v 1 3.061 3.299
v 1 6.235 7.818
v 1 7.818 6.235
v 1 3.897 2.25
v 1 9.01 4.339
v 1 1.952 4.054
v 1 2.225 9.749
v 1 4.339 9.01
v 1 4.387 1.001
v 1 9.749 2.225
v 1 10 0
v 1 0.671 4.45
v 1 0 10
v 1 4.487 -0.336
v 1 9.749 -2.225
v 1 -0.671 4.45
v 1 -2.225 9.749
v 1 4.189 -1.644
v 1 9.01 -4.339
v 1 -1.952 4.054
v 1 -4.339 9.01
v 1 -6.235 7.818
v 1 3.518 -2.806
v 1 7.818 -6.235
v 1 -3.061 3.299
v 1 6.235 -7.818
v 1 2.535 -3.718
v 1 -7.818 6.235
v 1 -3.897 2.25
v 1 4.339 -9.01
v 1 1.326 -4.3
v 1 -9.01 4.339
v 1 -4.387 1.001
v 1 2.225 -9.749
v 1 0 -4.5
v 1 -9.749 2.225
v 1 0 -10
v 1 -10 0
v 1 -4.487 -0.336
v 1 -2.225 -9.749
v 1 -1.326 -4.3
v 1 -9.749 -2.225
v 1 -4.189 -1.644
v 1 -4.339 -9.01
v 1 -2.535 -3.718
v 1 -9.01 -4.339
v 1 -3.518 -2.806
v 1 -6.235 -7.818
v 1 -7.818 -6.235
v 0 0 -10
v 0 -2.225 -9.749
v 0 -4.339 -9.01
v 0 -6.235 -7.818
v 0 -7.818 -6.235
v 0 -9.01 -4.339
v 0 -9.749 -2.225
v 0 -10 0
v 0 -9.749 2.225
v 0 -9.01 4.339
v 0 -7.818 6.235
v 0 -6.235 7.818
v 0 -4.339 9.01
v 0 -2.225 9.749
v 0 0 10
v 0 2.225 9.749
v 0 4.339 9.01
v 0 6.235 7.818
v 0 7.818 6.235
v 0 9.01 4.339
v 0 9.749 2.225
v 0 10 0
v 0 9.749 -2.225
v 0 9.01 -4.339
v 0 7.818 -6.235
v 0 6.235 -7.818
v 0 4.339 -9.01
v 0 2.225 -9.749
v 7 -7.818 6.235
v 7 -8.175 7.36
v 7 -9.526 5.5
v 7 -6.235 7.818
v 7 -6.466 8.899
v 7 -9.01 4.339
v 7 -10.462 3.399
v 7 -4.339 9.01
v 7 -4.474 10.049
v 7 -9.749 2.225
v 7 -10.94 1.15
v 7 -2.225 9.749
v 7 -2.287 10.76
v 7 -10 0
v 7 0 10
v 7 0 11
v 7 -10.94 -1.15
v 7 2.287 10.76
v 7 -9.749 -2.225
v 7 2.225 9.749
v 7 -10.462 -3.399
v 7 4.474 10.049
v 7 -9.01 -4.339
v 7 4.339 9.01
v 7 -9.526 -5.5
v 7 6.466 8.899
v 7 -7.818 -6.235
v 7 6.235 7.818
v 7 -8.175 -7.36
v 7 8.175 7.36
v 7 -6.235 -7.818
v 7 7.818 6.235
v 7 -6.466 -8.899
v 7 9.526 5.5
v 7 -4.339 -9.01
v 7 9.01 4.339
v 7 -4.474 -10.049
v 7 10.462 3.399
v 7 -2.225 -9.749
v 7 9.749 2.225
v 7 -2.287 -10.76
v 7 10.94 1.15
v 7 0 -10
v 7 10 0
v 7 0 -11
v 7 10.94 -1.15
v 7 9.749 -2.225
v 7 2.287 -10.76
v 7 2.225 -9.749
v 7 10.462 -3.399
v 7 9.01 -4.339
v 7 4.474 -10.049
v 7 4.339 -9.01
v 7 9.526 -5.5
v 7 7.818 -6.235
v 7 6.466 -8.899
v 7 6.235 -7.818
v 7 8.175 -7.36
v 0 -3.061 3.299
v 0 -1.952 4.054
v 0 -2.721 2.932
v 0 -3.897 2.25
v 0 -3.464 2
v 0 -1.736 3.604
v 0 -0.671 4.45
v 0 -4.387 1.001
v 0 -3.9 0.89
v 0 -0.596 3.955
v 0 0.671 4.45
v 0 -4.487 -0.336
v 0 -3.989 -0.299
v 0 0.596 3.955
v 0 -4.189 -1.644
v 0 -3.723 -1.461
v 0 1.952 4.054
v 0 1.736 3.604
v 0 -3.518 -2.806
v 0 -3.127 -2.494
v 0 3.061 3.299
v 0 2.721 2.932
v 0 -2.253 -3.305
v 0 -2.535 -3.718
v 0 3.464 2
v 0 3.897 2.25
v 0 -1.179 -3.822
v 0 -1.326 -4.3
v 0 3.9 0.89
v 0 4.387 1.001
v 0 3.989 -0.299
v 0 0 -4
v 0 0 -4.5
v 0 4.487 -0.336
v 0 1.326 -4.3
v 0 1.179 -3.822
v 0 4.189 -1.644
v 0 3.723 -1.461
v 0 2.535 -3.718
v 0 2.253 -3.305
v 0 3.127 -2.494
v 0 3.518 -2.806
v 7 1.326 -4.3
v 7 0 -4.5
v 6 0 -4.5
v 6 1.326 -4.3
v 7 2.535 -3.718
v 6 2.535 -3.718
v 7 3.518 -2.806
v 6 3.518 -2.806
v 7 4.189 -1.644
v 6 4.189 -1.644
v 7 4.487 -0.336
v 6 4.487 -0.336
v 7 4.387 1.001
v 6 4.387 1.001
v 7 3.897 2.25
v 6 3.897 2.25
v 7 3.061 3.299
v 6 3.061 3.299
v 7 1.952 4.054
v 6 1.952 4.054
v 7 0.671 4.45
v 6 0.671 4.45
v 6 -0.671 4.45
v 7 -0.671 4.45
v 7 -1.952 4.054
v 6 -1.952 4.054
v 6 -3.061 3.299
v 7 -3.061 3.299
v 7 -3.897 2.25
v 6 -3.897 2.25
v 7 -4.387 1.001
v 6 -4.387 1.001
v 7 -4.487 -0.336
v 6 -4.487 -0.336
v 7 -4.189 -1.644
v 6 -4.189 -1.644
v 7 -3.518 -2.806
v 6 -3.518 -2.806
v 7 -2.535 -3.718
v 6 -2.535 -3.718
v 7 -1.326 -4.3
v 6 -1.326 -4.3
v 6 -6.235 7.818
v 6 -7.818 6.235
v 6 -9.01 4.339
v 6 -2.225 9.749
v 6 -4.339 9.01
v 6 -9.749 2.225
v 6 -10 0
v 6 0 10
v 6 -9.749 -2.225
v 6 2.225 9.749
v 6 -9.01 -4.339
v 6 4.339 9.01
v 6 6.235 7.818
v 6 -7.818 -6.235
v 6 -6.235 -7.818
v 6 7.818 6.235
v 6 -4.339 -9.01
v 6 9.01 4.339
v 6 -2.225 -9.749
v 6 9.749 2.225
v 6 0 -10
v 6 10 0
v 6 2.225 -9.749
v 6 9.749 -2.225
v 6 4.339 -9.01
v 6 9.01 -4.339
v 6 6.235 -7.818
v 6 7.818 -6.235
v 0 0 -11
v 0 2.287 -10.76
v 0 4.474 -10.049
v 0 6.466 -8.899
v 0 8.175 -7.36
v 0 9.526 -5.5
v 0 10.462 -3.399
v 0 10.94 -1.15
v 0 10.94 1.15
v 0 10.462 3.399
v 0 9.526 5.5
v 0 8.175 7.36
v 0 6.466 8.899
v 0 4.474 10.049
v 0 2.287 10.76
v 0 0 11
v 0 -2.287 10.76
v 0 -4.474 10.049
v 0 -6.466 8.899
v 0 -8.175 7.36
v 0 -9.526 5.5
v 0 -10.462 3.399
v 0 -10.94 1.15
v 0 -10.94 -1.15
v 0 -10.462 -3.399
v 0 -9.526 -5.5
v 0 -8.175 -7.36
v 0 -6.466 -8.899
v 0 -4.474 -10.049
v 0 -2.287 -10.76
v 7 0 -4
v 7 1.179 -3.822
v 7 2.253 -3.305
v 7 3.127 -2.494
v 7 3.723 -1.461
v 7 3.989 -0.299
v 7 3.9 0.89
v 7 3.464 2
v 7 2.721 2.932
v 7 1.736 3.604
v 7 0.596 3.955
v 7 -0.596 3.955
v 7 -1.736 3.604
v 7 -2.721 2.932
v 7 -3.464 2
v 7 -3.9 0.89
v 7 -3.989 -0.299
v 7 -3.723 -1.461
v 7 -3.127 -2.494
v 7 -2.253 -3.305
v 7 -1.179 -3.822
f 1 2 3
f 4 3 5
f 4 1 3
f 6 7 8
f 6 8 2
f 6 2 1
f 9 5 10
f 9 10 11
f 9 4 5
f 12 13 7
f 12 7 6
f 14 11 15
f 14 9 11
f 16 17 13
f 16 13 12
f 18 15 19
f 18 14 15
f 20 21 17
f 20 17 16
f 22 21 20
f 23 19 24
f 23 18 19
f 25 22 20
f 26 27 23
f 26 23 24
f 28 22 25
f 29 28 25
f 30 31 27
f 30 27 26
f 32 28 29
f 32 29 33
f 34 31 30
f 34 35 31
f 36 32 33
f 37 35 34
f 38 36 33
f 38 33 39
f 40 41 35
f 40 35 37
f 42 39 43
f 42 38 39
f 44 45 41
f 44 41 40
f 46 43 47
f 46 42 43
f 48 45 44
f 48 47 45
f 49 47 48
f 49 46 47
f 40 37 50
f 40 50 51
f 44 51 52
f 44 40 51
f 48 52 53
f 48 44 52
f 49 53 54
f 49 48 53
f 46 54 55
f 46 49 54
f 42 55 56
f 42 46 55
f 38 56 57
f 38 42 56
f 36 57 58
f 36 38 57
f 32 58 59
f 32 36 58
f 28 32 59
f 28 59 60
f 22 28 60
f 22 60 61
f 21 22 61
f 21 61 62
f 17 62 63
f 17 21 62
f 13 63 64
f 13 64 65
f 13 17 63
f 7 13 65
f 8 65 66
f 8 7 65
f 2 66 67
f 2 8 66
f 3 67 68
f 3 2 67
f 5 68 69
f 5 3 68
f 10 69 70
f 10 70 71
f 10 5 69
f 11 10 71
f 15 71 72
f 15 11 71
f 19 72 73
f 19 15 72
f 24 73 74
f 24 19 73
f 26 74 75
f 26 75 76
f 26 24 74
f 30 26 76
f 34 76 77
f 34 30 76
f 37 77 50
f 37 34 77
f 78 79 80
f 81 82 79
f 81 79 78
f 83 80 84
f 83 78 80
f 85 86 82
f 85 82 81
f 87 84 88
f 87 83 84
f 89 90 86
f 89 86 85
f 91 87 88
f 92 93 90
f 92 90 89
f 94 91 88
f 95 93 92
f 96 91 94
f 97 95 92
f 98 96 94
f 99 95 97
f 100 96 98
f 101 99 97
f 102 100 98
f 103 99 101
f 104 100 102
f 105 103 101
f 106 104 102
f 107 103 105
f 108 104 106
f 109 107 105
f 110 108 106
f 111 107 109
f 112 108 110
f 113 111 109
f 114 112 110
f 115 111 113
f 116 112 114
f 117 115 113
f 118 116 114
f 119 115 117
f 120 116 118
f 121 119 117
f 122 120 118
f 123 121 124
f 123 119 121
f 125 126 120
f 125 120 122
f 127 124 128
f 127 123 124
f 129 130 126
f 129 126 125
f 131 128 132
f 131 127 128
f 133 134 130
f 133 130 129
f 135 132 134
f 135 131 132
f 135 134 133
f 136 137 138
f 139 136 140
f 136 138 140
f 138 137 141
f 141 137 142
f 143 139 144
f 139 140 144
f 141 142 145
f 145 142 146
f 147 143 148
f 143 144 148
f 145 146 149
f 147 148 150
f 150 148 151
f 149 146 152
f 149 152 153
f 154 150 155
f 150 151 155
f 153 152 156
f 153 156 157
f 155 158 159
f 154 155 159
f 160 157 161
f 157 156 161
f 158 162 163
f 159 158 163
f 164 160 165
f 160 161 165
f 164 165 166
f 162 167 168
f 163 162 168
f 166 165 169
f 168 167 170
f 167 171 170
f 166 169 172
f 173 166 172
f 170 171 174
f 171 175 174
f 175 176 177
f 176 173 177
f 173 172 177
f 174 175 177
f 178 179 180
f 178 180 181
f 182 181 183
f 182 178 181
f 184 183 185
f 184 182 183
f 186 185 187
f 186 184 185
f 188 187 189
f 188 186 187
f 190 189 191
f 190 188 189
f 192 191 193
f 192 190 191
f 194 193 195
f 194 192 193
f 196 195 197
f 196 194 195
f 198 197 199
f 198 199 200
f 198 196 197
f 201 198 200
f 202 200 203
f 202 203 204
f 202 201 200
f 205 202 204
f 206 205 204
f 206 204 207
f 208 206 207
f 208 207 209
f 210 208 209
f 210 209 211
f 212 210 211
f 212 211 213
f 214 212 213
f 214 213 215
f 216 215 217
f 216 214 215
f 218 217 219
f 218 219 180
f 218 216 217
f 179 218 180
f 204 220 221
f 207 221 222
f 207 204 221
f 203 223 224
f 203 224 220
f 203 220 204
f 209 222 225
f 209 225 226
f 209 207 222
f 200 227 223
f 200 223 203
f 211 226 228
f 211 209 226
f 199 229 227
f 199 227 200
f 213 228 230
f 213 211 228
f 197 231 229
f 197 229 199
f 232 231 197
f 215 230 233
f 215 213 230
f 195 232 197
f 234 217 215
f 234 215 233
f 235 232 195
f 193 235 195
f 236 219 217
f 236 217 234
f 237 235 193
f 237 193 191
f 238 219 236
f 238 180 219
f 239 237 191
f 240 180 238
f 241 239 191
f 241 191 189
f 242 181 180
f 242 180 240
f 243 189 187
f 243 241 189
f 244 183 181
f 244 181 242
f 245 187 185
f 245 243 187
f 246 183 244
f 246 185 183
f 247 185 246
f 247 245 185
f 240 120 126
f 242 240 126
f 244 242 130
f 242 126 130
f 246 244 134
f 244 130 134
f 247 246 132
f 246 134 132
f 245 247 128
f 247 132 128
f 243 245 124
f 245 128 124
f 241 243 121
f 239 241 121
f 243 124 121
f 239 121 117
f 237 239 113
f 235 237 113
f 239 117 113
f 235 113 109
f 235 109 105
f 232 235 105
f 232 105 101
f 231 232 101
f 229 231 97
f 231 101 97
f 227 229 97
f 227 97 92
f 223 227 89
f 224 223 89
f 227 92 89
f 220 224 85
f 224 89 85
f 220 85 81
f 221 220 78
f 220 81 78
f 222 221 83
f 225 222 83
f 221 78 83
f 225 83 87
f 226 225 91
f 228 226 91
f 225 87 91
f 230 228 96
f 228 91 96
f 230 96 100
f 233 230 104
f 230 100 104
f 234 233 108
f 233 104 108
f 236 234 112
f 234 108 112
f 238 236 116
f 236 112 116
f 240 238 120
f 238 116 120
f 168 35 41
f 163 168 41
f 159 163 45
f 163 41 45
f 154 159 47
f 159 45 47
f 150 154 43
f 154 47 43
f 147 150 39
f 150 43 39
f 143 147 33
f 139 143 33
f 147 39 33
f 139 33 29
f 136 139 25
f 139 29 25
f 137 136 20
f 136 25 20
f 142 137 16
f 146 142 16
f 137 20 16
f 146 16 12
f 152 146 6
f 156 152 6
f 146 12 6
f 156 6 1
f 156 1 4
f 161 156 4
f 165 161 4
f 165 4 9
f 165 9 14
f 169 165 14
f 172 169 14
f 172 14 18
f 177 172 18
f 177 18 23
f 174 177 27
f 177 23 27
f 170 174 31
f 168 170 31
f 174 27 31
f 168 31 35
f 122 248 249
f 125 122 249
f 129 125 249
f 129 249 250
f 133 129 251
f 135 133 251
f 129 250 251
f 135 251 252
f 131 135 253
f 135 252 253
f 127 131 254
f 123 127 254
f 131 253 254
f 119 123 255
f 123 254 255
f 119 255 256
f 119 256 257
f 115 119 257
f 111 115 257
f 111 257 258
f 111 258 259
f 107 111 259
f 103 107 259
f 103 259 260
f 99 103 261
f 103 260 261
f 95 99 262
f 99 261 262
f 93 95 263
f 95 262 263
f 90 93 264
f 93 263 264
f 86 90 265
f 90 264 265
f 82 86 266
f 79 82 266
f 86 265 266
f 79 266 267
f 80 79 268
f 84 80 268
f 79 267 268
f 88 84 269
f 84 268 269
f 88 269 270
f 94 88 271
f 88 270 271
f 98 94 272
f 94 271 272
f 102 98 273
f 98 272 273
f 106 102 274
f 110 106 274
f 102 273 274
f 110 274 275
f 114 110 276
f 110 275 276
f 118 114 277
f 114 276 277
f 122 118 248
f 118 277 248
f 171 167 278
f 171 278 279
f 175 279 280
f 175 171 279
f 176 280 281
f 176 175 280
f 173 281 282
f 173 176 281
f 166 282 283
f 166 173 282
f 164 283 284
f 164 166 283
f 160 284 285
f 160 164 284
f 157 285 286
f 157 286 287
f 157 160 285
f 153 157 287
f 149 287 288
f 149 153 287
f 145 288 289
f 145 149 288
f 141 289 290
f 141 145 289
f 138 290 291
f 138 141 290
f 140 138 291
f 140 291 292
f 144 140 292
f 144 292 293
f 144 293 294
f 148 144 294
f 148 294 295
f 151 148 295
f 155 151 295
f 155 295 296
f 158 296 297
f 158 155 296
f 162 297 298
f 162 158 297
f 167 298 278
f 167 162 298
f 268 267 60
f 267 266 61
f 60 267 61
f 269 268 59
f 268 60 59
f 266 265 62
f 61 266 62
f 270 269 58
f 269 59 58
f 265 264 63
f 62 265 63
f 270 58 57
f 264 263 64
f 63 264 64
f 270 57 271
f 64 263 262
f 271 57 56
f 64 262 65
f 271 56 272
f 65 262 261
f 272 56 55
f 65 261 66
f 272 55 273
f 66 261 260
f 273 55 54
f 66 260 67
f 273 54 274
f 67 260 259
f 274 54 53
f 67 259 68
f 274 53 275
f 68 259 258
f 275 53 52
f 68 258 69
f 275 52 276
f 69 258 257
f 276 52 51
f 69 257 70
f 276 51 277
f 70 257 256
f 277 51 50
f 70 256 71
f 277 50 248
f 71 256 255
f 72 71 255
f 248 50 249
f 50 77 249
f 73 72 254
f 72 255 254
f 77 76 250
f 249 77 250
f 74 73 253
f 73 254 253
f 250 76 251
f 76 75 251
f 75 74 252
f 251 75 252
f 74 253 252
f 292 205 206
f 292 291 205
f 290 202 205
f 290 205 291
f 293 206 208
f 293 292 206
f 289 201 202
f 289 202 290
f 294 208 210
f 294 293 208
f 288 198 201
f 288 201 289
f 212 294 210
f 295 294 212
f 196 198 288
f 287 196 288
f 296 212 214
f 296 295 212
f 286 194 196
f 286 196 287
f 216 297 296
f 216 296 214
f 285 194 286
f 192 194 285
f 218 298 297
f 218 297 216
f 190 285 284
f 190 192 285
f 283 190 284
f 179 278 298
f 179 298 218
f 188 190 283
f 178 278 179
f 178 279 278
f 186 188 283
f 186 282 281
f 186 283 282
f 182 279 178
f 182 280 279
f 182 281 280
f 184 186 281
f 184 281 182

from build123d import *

# Parameters (mm, degrees)
CROQUIS1_R              = 11
CROQUIS1_R_2            = 4
SALIENTE_EXTRUIR1_DEPTH = 7
CROQUIS2_R              = 10
CROQUIS2_R_2            = 4.5
CORTAR_EXTRUIR1_DEPTH   = 1
CORTAR_EXTRUIR2_START   = -1
CROQUIS3_R              = 10
CROQUIS3_R_2            = 4.5
CORTAR_EXTRUIR2_DEPTH   = 1


with BuildPart() as part:
    # Croquis1 → Saliente-Extruir1 (new body)
    with BuildSketch(Plane(origin=(0, 0, 0), x_dir=(0, 0, -1), z_dir=(1, 0, 0))):
        Circle(CROQUIS1_R)
        Circle(CROQUIS1_R_2, mode=Mode.SUBTRACT)
    extrude(amount=SALIENTE_EXTRUIR1_DEPTH)

    # Croquis2 → Cortar-Extruir1 (cut)
    with BuildSketch(Plane(origin=(7, 0, 0), x_dir=(0, 0, -1), z_dir=(1, 0, 0))):
        Circle(CROQUIS2_R)
        Circle(CROQUIS2_R_2, mode=Mode.SUBTRACT)
    extrude(amount=-CORTAR_EXTRUIR1_DEPTH, mode=Mode.SUBTRACT)

    # Croquis3 → Cortar-Extruir2 (cut)
    with BuildSketch(Plane.ZY.offset(CORTAR_EXTRUIR2_START)):
        with Locations(Location((0, 0, 0), (0, 0, 180))):
            Circle(CROQUIS3_R)
        with Locations(Location((0, 0, 0), (0, 0, 180))):
            Circle(CROQUIS3_R_2, mode=Mode.SUBTRACT)
    extrude(amount=CORTAR_EXTRUIR2_DEPTH, mode=Mode.SUBTRACT)


solid = part.part
